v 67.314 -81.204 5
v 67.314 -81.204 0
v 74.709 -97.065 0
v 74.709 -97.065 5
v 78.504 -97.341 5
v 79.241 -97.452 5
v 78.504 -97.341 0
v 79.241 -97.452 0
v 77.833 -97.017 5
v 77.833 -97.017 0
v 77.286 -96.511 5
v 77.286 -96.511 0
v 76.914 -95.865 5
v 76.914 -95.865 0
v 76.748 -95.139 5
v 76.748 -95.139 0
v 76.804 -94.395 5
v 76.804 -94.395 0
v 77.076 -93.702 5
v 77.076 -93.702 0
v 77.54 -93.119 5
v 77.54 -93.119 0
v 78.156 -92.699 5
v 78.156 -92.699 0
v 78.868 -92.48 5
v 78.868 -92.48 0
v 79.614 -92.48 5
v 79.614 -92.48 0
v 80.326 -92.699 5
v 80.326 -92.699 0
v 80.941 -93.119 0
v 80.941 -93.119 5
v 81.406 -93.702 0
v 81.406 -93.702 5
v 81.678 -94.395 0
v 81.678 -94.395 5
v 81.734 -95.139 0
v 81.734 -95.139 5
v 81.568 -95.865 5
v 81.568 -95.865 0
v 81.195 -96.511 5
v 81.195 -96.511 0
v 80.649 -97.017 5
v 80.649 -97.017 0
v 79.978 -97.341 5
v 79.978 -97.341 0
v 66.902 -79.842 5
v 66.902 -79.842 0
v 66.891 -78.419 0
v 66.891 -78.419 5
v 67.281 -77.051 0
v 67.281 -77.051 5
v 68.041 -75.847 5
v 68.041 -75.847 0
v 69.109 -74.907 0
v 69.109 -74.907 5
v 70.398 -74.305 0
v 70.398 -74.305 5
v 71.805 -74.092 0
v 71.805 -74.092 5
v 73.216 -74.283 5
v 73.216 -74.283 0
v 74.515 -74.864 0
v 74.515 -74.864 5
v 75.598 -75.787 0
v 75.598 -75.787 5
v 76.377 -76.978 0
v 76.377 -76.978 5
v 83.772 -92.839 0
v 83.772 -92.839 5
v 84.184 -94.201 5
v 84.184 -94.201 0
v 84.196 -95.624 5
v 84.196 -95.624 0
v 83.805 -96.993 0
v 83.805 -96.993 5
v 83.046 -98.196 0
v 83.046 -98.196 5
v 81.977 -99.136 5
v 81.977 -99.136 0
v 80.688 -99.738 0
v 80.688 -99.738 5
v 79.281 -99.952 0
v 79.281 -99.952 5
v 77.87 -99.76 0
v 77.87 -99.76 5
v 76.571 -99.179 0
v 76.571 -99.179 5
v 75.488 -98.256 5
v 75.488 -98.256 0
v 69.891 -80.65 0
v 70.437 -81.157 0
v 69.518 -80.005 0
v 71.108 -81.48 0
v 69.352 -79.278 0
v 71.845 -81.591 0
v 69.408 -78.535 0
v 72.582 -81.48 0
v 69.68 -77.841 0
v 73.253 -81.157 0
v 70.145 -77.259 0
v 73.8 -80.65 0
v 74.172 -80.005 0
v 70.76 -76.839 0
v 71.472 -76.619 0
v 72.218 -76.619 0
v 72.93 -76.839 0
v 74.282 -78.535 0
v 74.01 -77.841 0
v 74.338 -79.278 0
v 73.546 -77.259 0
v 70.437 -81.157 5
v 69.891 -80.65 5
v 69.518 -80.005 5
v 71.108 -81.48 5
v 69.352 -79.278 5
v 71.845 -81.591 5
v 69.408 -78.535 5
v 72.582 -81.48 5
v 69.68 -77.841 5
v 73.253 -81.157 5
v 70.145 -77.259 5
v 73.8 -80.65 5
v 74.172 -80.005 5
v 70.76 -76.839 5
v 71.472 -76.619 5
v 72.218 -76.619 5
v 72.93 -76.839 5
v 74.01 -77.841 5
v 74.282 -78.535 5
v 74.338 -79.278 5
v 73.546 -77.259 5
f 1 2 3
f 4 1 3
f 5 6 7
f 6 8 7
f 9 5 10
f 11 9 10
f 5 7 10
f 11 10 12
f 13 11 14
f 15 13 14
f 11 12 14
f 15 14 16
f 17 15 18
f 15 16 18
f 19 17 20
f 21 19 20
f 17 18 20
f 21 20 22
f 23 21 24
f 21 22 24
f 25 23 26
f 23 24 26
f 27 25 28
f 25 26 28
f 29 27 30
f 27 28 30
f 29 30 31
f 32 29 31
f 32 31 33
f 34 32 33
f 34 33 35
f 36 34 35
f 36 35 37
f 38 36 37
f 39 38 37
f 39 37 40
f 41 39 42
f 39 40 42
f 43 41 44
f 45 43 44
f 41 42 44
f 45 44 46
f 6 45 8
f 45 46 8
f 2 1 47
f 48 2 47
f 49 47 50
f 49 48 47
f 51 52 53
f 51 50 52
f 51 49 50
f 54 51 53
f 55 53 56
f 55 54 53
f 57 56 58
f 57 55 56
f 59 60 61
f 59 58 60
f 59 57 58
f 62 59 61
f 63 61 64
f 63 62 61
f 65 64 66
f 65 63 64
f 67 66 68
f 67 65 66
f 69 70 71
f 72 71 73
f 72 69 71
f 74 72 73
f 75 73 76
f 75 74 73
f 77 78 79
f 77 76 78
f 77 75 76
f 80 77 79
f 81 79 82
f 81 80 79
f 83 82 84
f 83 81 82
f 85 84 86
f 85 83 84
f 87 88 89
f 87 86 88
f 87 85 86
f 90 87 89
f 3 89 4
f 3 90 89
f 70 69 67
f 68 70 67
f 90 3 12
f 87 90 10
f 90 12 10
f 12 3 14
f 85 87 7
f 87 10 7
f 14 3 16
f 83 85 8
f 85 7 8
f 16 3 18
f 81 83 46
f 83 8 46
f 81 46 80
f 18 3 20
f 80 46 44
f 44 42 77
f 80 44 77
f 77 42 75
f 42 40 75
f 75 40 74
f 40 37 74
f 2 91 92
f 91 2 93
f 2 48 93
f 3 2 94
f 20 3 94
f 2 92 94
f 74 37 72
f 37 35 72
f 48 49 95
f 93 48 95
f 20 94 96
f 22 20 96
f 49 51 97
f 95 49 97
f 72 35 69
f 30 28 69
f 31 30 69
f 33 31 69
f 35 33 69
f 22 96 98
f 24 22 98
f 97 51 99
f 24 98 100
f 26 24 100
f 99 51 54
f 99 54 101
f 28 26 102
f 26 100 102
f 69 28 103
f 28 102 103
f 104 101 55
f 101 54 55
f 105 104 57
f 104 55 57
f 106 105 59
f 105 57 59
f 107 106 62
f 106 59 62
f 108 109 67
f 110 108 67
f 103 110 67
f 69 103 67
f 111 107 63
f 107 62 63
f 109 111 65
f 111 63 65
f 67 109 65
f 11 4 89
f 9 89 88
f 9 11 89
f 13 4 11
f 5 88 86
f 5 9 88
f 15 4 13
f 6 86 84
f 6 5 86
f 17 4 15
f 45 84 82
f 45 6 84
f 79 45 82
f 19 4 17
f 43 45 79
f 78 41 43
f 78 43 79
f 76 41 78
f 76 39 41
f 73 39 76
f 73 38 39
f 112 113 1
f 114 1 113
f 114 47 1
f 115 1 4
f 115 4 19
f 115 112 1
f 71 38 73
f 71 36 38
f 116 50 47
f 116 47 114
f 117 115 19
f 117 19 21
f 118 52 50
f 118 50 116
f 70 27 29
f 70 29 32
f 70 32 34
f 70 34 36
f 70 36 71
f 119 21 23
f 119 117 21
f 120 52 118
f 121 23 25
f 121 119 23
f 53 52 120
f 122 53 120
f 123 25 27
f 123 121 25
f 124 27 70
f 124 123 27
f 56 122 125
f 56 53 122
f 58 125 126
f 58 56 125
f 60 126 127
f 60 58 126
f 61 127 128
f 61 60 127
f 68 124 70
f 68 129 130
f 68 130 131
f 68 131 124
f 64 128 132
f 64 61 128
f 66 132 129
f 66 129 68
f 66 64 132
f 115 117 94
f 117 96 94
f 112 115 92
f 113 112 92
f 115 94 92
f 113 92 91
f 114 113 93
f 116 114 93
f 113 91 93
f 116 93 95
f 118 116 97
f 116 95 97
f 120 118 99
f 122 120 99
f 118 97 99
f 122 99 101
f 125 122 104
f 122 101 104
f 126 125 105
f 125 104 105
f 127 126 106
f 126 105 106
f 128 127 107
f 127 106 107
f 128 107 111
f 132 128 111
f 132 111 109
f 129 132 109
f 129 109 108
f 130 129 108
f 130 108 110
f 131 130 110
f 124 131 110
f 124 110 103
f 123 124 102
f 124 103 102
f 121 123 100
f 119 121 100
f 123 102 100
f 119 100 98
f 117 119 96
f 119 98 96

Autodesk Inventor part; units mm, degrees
ref_plane "YZ Plane" through (0, 0, 0) normal (1, 0, 0) x (0, 1, 0)
ref_plane "XZ Plane" through (0, 0, 0) normal (0, 1, 0) x (-1, 0, 0)
ref_plane "XY Plane" through (0, 0, 0) normal (0, 0, 1) x (1, 0, 0)
sketch "Sketch3" plane through (0, 0, 0) normal (0, 0, 1) x (1, 0, 0)
  line L0 (71.8451, -79.0914) -> (79.2409, -94.9518) construction
  line L1 (67.3136, -81.2045) -> (74.7094, -97.0649)
  line L2 (83.7725, -92.8387) -> (76.3766, -76.9783)
  arc A0 (76.3766, -76.9783) -> (67.3136, -81.2045) centre (71.8451, -79.0914) ccw
  arc A1 (74.7094, -97.0649) -> (83.7725, -92.8387) centre (79.2409, -94.9518) ccw
  line L3 (79.2409, -94.9518) -> (71.8451, -79.0914)
  point P0 (0, 0)
  point P1 (75.543, -87.0216)
  dimension "d16" = 10
extrude "Extrusion2" add sketch "Sketch3" along normal blind 5
sketch "Sketch4" plane through (0, 0, 5) normal (0, 0, 1) x (1, 0, 0)
  line L0 (67.3136, -81.2045) -> (74.7094, -97.0649) projected
  arc A0 (74.7094, -97.0649) -> (83.7725, -92.8387) centre (79.2409, -94.9518) ccw projected
  line L1 (83.7725, -92.8387) -> (76.3766, -76.9783) projected
  arc A1 (76.3766, -76.9783) -> (67.3136, -81.2045) centre (71.8451, -79.0914) ccw projected
  point P0 (0, 0)
hole "Hole1" at (71.8451, -79.0914, 5) at (79.2409, -94.9518, 5) direction (0, 0, -1) diameter 5 end through all
properties part number "avstandsstykke"
